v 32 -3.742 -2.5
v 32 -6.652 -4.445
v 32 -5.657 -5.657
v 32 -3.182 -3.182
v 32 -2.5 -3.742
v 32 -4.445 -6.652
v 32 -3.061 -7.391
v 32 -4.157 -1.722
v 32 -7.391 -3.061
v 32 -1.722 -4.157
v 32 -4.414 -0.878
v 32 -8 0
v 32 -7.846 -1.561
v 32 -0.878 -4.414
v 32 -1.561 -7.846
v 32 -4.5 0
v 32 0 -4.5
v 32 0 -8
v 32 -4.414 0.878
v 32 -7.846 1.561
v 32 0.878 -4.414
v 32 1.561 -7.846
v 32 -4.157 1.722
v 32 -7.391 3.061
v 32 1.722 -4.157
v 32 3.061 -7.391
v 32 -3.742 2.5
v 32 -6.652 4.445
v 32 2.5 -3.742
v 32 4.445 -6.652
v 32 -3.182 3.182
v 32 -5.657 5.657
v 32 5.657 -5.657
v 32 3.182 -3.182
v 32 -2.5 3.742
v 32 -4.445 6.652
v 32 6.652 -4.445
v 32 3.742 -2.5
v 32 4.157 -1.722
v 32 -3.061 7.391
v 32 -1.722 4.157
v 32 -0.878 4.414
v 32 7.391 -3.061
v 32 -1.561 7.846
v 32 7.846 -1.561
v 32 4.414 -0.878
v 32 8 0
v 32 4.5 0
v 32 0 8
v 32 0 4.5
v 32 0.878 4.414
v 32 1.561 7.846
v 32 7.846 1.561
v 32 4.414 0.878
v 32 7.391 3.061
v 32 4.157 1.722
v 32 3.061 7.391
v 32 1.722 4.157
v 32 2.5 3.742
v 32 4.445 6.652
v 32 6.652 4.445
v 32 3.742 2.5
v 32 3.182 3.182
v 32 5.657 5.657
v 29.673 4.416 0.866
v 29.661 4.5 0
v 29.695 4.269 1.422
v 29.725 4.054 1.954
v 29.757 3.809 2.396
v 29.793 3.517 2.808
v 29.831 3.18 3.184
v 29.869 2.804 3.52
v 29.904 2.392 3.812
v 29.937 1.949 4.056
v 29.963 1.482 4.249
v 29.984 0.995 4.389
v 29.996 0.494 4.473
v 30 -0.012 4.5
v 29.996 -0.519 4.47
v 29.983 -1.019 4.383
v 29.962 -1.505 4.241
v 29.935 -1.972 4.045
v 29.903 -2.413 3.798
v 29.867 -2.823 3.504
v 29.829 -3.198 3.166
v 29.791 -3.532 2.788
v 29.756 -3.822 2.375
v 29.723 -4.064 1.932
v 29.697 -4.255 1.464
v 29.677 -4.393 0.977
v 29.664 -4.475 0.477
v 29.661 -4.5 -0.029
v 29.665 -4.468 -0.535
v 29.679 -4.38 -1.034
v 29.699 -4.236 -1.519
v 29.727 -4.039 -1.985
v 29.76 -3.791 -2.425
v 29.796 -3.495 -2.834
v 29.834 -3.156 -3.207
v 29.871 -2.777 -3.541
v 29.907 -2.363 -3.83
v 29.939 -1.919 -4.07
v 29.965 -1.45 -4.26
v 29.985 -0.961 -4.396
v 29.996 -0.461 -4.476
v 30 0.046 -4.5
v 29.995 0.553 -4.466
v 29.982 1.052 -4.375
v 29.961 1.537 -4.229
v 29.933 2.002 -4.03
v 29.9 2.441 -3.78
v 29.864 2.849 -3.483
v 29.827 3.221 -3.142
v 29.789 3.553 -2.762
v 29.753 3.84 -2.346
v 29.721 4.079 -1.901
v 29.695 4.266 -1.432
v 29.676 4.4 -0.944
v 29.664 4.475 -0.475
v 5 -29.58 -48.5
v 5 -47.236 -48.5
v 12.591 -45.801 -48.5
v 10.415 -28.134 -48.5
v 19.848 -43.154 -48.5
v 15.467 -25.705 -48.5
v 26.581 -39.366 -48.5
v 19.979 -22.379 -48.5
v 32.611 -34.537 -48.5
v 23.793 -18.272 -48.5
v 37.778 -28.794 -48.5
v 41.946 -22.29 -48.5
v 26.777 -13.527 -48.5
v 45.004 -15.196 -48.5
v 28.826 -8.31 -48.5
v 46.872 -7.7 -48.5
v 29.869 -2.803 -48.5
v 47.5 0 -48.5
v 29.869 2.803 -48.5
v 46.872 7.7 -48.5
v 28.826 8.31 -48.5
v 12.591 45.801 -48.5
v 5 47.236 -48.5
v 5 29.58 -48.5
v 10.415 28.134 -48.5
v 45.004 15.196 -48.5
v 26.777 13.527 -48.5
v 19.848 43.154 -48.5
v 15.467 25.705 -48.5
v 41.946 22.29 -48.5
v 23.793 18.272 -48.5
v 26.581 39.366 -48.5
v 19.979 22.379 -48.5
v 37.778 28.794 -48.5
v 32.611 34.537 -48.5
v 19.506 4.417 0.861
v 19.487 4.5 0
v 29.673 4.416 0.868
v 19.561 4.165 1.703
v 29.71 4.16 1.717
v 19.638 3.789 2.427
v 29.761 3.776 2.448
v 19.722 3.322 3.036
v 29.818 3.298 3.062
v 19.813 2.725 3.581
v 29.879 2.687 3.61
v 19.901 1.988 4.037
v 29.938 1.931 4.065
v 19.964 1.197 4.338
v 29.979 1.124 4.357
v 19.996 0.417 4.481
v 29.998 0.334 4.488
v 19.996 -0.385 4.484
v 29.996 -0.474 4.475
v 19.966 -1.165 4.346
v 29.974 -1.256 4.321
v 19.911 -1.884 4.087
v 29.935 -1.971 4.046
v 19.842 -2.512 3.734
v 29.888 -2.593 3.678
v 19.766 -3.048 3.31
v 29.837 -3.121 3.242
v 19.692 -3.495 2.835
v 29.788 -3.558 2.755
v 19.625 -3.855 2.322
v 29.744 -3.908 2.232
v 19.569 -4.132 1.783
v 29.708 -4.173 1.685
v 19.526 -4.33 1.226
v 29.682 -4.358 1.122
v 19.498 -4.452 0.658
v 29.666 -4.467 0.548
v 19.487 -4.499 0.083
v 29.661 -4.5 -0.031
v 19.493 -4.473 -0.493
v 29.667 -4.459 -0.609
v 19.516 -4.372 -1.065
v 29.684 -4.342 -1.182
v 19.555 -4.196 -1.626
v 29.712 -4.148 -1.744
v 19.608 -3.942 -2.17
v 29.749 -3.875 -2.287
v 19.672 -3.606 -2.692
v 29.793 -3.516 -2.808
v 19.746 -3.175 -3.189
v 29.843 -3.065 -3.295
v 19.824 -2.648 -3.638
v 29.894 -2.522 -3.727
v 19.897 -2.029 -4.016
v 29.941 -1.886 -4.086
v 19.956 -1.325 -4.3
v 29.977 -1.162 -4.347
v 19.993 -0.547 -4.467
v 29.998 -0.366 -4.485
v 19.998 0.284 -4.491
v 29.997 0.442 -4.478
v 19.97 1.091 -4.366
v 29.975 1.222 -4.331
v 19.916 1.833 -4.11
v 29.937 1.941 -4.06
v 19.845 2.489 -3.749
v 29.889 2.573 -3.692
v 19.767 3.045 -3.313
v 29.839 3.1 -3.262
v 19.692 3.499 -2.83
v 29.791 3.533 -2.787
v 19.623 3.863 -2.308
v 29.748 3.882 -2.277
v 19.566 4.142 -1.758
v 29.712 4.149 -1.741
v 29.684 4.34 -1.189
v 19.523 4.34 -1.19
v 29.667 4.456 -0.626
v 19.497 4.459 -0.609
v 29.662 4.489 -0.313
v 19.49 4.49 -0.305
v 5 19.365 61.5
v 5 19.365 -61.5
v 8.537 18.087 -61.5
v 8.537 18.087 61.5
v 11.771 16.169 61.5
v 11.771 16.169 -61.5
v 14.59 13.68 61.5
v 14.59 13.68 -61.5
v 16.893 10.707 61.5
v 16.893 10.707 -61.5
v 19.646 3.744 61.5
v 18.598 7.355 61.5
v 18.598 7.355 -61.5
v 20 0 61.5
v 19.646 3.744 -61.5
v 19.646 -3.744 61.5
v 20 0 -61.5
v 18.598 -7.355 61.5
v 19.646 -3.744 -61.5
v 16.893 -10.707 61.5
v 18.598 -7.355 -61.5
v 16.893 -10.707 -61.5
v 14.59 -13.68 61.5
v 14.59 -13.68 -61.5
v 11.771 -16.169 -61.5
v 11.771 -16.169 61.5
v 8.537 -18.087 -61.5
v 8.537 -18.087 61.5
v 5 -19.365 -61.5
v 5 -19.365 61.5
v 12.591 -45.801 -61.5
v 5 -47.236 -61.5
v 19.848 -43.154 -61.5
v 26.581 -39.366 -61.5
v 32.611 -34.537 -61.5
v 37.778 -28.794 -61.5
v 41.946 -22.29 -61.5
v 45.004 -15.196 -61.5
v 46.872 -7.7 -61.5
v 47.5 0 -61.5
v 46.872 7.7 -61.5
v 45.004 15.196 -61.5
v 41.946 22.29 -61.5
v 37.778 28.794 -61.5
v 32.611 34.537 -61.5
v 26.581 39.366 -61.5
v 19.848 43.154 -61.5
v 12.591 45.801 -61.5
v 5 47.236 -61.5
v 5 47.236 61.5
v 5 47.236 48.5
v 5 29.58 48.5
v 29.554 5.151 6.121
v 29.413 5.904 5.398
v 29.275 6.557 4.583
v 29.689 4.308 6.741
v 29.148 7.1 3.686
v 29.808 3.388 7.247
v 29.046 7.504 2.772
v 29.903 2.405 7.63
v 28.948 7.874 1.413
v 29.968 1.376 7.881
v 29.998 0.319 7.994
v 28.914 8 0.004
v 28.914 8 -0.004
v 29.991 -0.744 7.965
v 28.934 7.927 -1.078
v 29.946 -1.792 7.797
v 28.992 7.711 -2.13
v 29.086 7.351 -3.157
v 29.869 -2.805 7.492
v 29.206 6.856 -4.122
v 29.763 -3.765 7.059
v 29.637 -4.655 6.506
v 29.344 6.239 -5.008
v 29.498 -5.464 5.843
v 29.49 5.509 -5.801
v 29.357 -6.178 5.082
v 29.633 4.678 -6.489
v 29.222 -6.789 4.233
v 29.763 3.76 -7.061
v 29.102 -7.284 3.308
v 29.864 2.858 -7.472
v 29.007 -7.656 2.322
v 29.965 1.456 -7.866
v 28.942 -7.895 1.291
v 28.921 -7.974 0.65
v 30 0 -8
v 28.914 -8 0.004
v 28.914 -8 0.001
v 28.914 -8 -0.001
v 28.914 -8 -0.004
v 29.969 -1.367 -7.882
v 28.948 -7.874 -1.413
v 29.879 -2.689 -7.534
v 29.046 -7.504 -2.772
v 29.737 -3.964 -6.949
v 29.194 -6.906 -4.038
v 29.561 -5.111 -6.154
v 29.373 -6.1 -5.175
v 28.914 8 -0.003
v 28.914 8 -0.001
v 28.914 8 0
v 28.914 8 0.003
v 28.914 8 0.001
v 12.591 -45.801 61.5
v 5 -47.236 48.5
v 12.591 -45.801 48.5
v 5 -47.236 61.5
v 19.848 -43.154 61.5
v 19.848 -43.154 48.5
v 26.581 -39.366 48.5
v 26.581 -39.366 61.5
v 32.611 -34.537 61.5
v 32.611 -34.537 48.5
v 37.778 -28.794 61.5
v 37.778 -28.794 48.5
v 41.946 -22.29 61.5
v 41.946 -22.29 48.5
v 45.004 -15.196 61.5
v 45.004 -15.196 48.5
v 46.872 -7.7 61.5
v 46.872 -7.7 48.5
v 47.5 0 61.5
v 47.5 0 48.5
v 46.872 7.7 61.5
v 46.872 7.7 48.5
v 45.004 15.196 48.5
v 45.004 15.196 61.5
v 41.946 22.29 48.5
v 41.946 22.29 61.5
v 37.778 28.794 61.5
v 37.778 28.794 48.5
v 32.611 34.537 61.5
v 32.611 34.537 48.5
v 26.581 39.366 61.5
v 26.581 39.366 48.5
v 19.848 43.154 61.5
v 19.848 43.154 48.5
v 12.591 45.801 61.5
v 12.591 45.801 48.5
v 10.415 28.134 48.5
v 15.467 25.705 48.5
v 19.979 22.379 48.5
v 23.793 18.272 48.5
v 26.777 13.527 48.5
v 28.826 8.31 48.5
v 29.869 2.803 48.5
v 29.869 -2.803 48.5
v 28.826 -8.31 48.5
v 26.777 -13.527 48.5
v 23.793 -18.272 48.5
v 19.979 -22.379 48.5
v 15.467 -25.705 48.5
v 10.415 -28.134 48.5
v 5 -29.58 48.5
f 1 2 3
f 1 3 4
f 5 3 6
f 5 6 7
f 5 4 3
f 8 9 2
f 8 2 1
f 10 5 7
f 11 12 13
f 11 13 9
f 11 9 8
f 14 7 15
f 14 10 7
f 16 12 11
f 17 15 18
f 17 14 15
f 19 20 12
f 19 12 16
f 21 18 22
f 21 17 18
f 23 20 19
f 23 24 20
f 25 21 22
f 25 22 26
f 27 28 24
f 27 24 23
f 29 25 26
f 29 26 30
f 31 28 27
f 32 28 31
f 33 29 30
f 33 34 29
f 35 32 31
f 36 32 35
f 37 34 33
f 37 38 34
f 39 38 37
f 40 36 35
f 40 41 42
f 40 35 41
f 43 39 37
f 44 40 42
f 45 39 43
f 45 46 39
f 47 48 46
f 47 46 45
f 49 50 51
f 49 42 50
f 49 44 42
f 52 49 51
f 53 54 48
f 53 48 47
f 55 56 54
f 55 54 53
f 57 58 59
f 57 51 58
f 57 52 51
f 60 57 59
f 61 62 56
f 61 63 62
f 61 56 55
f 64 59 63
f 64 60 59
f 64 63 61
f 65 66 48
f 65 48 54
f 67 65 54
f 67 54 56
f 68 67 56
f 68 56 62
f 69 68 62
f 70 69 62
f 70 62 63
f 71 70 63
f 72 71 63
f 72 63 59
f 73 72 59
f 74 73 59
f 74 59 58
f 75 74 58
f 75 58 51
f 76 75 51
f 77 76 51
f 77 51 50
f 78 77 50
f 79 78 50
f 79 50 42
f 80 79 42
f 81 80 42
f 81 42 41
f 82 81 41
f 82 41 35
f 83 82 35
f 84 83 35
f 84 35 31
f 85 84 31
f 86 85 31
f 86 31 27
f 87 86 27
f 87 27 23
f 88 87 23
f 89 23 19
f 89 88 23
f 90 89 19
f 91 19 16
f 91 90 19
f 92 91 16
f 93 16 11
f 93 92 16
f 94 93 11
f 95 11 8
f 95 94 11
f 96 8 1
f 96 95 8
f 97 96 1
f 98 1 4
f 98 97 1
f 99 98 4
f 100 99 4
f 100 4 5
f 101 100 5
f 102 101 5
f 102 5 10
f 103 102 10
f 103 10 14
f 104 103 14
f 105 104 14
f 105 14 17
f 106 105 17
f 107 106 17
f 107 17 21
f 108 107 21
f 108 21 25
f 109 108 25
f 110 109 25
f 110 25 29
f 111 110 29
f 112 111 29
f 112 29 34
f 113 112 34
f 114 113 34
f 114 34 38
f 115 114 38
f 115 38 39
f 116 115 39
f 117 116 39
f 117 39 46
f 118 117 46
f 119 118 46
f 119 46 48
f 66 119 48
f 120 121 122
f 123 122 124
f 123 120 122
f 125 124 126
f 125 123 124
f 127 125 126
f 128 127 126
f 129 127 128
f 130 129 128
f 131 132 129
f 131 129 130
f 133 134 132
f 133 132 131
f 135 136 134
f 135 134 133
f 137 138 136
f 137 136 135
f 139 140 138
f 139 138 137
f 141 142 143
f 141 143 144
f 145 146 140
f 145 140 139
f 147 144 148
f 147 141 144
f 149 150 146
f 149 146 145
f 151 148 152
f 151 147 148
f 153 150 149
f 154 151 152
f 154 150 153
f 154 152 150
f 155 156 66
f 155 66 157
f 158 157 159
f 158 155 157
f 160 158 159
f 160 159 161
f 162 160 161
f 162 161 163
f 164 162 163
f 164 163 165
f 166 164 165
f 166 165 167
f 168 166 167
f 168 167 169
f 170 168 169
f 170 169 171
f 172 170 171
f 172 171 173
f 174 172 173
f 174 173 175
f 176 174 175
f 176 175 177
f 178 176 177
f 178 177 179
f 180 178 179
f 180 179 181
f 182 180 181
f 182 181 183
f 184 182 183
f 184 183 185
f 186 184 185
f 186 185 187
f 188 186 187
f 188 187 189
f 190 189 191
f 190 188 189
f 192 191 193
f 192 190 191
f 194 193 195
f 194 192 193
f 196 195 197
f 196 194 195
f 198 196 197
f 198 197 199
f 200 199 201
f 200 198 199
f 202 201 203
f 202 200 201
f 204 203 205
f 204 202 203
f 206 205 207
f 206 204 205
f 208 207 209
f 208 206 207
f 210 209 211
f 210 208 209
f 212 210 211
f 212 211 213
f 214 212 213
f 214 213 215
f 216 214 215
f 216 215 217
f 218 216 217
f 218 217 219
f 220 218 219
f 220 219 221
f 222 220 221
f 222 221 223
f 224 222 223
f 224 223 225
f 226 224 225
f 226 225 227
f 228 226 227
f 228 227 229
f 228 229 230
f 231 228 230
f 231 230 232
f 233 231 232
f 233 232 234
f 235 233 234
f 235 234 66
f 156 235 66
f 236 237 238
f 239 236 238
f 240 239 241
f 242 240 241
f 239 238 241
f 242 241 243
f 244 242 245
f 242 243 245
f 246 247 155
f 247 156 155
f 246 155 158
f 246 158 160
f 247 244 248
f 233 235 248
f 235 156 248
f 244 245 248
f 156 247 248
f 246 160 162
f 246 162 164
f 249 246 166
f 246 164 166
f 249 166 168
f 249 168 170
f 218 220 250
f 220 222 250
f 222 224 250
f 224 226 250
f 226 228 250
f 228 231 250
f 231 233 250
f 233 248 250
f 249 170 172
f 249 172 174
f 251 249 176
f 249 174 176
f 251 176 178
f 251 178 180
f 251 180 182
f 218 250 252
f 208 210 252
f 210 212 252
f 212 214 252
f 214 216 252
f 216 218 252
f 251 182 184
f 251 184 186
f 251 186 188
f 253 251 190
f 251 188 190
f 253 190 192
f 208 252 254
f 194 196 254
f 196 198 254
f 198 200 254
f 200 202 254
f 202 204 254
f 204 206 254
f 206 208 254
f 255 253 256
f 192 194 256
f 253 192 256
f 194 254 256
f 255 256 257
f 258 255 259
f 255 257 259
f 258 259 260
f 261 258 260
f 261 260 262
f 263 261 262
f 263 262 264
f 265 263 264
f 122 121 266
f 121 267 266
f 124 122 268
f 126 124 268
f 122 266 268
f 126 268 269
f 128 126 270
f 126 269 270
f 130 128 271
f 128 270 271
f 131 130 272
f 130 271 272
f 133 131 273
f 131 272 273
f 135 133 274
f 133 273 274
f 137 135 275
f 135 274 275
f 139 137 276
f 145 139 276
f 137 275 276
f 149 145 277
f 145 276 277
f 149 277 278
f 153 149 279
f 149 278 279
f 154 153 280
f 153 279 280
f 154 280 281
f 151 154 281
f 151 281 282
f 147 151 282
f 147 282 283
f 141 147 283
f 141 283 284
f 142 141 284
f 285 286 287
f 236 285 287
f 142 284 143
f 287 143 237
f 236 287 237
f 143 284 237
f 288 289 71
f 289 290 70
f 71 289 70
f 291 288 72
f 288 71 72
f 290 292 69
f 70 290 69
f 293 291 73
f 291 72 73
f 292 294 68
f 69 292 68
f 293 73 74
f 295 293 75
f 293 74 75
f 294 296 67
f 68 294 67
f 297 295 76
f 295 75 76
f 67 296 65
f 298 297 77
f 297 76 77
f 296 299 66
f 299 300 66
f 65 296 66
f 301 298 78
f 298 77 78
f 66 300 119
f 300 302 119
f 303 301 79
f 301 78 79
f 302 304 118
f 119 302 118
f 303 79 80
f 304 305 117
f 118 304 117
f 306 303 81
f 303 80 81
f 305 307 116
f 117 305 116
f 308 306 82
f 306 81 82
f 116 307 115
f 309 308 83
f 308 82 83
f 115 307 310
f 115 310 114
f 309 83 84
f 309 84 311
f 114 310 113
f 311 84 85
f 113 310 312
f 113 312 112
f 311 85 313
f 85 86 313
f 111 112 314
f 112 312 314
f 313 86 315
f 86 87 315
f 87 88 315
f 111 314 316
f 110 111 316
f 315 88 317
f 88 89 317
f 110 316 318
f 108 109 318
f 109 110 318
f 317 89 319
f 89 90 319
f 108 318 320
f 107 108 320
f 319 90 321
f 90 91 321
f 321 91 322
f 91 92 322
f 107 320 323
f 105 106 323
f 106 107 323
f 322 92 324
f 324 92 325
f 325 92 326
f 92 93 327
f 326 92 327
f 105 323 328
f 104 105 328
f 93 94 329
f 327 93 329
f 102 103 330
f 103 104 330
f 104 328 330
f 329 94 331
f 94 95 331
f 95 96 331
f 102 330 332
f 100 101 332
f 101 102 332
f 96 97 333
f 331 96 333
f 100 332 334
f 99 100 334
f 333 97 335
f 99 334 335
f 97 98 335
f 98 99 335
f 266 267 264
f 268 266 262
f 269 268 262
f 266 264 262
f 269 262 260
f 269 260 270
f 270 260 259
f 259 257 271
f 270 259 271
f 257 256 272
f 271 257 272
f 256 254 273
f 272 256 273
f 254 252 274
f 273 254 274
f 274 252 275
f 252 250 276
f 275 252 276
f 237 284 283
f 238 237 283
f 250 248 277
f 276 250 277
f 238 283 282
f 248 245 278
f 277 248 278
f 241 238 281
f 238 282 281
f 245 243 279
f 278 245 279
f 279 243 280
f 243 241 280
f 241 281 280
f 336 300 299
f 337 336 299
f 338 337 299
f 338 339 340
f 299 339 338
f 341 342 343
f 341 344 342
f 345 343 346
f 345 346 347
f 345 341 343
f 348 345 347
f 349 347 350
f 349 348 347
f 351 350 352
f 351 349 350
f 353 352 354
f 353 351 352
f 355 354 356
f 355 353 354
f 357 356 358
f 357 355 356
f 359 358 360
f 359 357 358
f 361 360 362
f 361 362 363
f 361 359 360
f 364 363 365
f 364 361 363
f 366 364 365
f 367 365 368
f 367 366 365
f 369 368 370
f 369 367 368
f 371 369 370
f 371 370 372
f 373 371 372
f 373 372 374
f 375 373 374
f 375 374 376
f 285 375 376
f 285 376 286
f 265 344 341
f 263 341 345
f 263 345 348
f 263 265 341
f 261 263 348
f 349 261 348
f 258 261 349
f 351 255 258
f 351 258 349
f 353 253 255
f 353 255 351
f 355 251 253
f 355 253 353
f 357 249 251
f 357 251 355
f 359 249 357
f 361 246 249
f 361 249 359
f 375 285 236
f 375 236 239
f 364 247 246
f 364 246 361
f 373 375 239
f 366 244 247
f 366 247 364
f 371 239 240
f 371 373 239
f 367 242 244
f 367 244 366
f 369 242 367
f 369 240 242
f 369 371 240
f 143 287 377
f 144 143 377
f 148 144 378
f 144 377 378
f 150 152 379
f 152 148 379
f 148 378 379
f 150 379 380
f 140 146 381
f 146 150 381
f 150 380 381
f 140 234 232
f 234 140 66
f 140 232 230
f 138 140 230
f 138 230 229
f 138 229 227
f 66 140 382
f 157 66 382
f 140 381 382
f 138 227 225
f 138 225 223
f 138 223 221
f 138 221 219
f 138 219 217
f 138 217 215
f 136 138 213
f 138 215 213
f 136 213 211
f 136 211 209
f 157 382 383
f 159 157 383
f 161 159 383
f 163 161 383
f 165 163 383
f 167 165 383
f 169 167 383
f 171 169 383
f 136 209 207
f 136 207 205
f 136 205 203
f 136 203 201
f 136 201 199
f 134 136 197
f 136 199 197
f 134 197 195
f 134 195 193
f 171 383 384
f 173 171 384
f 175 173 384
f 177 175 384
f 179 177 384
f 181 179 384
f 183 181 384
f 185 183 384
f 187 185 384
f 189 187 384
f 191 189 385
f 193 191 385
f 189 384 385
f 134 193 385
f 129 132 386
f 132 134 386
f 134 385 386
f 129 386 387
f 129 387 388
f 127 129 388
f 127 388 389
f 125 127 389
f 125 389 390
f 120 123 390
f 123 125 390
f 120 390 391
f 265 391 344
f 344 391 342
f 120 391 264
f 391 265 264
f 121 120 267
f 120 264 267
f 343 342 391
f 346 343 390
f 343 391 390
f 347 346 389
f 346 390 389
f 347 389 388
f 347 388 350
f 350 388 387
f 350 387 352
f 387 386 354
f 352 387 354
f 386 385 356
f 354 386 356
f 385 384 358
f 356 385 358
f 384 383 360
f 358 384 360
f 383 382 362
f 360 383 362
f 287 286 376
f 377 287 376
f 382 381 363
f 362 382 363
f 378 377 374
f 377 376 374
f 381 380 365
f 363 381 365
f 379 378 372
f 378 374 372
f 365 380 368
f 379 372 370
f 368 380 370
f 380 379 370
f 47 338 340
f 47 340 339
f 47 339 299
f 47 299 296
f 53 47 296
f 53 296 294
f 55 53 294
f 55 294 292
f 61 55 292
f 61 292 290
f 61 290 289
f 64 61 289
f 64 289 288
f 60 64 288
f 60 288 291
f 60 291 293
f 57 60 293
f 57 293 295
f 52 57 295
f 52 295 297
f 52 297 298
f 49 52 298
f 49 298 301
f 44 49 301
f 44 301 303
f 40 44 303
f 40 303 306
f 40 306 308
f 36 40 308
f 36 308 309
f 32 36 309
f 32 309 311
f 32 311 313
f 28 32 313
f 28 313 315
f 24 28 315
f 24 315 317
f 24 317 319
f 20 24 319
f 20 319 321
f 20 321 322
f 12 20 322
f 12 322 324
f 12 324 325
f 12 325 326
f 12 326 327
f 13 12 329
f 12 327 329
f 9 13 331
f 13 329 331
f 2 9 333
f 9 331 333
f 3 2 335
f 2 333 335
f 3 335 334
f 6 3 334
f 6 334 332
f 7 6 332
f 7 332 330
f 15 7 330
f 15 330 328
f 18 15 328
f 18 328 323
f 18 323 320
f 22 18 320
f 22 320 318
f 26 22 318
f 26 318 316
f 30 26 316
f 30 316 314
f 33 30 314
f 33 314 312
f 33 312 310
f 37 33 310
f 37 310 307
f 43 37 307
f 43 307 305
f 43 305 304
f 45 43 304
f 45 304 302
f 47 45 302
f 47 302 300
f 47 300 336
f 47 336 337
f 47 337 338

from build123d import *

# Parameters (mm, degrees)
BOSS_EXTRUDE2_DEPTH = 55
BOSS_EXTRUDE5_DEPTH = 6.5
HOLE1_START         = 30.000000107
HOLE1_OUTLINE_R     = 8
HOLE1_OUTLINE_R_2   = 4.5
HOLE1_DEPTH         = 1.999999893
HOLE1_START_2       = 28.913664955
HOLE1_2_OUTLINE_R   = 8
HOLE1_2_OUTLINE_R_2 = 4.5
HOLE1_2_DEPTH       = 1.086335152
HOLE1_START_3       = 5
HOLE1_4_OUTLINE_R   = 4.5
HOLE1_4_DEPTH       = 26


with BuildPart() as part:
    # Sketch2 → Boss-Extrude2 (new, symmetric)
    with BuildSketch(Plane.XY):
        with BuildLine():
            Line((5, 19.364916731), (5, 29.580398915))
            ThreePointArc((5, 29.580398915), (30, 0), (5, -29.580398915))
            Line((5, -29.580398915), (5, -19.364916731))
            ThreePointArc((5, -19.364916731), (20, 0), (5, 19.364916731))
        make_face()
    extrude(amount=BOSS_EXTRUDE2_DEPTH, both=True)

    # Sketch4 → Boss-Extrude5 (add, symmetric)
    with BuildSketch(Plane.XY.offset(55)):
        with BuildLine():
            Line((5, 47.236109069), (5, 29.580398915))
            ThreePointArc((5, 29.580398915), (30, 0), (5, -29.580398915))
            Line((5, -29.580398915), (5, -47.236109069))
            ThreePointArc((5, -47.236109069), (47.5, 0), (5, 47.236109069))
        make_face()
        with BuildLine():
            Line((5, 29.580398915), (5, 19.364916731))
            ThreePointArc((5, 19.364916731), (20, 0), (5, -19.364916731))
            Line((5, -19.364916731), (5, -29.580398915))
            ThreePointArc((5, -29.580398915), (30, 0), (5, 29.580398915))
        make_face()
    extrude(amount=BOSS_EXTRUDE5_DEPTH, both=True)

    # Mirror1: part across plane


with BuildPart() as part_1:
    add(part.part)
    add(part.part.mirror(Plane.XY))

    # Hole1 4 outline → Hole1 4 (cut)
    with BuildSketch(Plane.YZ.offset(HOLE1_START_3)):
        Circle(HOLE1_4_OUTLINE_R)
    extrude(amount=HOLE1_4_DEPTH, mode=Mode.SUBTRACT)


with BuildPart() as body_2:
    # Hole1: read off the stored shape, not the designer's step
    # Hole1 outline → Hole1 (new body)
    with BuildSketch(Plane.YZ.offset(HOLE1_START)):
        Circle(HOLE1_OUTLINE_R)
        Circle(HOLE1_OUTLINE_R_2, mode=Mode.SUBTRACT)
    extrude(amount=HOLE1_DEPTH)

    # Hole1 2 outline → Hole1 2 (add)
    with BuildSketch(Plane.YZ.offset(HOLE1_START_2)):
        Circle(HOLE1_2_OUTLINE_R)
        Circle(HOLE1_2_OUTLINE_R_2, mode=Mode.SUBTRACT)
    extrude(amount=HOLE1_2_DEPTH)

    # Hole1 3: loft between two sections, ruled curve by curve
    hole1_3_from = [
        Edge.make_three_point_arc((28.913509771, 8.000559526, 8.000558771), (30, 6.03e-07, 8.000558771), (28.913510093, -8.000558363, 8.000558771)),
        Edge.make_line((28.913510093, -8.000558363, 8.000558771), (28.913509771, 8.000559526, 8.000558771)),
    ]
    hole1_3_to = [
        Edge.make_three_point_arc((28.913509771, 8.000559526, -8.000001872), (30, 6.03e-07, -8.000001872), (28.913510093, -8.000558363, -8.000001872)),
        Edge.make_line((28.913510093, -8.000558363, -8.000001872), (28.913509771, 8.000559526, -8.000001872)),
    ]
    hole1_3 = Solid(Shell([*[Face.make_surface_from_curves(hole1_3_from[k], hole1_3_to[k]) for k in range(2)], Face(Wire(hole1_3_from)), Face(Wire(hole1_3_to))]))
    add(hole1_3, mode=Mode.SUBTRACT)


solid = Compound([part_1.part, body_2.part])
